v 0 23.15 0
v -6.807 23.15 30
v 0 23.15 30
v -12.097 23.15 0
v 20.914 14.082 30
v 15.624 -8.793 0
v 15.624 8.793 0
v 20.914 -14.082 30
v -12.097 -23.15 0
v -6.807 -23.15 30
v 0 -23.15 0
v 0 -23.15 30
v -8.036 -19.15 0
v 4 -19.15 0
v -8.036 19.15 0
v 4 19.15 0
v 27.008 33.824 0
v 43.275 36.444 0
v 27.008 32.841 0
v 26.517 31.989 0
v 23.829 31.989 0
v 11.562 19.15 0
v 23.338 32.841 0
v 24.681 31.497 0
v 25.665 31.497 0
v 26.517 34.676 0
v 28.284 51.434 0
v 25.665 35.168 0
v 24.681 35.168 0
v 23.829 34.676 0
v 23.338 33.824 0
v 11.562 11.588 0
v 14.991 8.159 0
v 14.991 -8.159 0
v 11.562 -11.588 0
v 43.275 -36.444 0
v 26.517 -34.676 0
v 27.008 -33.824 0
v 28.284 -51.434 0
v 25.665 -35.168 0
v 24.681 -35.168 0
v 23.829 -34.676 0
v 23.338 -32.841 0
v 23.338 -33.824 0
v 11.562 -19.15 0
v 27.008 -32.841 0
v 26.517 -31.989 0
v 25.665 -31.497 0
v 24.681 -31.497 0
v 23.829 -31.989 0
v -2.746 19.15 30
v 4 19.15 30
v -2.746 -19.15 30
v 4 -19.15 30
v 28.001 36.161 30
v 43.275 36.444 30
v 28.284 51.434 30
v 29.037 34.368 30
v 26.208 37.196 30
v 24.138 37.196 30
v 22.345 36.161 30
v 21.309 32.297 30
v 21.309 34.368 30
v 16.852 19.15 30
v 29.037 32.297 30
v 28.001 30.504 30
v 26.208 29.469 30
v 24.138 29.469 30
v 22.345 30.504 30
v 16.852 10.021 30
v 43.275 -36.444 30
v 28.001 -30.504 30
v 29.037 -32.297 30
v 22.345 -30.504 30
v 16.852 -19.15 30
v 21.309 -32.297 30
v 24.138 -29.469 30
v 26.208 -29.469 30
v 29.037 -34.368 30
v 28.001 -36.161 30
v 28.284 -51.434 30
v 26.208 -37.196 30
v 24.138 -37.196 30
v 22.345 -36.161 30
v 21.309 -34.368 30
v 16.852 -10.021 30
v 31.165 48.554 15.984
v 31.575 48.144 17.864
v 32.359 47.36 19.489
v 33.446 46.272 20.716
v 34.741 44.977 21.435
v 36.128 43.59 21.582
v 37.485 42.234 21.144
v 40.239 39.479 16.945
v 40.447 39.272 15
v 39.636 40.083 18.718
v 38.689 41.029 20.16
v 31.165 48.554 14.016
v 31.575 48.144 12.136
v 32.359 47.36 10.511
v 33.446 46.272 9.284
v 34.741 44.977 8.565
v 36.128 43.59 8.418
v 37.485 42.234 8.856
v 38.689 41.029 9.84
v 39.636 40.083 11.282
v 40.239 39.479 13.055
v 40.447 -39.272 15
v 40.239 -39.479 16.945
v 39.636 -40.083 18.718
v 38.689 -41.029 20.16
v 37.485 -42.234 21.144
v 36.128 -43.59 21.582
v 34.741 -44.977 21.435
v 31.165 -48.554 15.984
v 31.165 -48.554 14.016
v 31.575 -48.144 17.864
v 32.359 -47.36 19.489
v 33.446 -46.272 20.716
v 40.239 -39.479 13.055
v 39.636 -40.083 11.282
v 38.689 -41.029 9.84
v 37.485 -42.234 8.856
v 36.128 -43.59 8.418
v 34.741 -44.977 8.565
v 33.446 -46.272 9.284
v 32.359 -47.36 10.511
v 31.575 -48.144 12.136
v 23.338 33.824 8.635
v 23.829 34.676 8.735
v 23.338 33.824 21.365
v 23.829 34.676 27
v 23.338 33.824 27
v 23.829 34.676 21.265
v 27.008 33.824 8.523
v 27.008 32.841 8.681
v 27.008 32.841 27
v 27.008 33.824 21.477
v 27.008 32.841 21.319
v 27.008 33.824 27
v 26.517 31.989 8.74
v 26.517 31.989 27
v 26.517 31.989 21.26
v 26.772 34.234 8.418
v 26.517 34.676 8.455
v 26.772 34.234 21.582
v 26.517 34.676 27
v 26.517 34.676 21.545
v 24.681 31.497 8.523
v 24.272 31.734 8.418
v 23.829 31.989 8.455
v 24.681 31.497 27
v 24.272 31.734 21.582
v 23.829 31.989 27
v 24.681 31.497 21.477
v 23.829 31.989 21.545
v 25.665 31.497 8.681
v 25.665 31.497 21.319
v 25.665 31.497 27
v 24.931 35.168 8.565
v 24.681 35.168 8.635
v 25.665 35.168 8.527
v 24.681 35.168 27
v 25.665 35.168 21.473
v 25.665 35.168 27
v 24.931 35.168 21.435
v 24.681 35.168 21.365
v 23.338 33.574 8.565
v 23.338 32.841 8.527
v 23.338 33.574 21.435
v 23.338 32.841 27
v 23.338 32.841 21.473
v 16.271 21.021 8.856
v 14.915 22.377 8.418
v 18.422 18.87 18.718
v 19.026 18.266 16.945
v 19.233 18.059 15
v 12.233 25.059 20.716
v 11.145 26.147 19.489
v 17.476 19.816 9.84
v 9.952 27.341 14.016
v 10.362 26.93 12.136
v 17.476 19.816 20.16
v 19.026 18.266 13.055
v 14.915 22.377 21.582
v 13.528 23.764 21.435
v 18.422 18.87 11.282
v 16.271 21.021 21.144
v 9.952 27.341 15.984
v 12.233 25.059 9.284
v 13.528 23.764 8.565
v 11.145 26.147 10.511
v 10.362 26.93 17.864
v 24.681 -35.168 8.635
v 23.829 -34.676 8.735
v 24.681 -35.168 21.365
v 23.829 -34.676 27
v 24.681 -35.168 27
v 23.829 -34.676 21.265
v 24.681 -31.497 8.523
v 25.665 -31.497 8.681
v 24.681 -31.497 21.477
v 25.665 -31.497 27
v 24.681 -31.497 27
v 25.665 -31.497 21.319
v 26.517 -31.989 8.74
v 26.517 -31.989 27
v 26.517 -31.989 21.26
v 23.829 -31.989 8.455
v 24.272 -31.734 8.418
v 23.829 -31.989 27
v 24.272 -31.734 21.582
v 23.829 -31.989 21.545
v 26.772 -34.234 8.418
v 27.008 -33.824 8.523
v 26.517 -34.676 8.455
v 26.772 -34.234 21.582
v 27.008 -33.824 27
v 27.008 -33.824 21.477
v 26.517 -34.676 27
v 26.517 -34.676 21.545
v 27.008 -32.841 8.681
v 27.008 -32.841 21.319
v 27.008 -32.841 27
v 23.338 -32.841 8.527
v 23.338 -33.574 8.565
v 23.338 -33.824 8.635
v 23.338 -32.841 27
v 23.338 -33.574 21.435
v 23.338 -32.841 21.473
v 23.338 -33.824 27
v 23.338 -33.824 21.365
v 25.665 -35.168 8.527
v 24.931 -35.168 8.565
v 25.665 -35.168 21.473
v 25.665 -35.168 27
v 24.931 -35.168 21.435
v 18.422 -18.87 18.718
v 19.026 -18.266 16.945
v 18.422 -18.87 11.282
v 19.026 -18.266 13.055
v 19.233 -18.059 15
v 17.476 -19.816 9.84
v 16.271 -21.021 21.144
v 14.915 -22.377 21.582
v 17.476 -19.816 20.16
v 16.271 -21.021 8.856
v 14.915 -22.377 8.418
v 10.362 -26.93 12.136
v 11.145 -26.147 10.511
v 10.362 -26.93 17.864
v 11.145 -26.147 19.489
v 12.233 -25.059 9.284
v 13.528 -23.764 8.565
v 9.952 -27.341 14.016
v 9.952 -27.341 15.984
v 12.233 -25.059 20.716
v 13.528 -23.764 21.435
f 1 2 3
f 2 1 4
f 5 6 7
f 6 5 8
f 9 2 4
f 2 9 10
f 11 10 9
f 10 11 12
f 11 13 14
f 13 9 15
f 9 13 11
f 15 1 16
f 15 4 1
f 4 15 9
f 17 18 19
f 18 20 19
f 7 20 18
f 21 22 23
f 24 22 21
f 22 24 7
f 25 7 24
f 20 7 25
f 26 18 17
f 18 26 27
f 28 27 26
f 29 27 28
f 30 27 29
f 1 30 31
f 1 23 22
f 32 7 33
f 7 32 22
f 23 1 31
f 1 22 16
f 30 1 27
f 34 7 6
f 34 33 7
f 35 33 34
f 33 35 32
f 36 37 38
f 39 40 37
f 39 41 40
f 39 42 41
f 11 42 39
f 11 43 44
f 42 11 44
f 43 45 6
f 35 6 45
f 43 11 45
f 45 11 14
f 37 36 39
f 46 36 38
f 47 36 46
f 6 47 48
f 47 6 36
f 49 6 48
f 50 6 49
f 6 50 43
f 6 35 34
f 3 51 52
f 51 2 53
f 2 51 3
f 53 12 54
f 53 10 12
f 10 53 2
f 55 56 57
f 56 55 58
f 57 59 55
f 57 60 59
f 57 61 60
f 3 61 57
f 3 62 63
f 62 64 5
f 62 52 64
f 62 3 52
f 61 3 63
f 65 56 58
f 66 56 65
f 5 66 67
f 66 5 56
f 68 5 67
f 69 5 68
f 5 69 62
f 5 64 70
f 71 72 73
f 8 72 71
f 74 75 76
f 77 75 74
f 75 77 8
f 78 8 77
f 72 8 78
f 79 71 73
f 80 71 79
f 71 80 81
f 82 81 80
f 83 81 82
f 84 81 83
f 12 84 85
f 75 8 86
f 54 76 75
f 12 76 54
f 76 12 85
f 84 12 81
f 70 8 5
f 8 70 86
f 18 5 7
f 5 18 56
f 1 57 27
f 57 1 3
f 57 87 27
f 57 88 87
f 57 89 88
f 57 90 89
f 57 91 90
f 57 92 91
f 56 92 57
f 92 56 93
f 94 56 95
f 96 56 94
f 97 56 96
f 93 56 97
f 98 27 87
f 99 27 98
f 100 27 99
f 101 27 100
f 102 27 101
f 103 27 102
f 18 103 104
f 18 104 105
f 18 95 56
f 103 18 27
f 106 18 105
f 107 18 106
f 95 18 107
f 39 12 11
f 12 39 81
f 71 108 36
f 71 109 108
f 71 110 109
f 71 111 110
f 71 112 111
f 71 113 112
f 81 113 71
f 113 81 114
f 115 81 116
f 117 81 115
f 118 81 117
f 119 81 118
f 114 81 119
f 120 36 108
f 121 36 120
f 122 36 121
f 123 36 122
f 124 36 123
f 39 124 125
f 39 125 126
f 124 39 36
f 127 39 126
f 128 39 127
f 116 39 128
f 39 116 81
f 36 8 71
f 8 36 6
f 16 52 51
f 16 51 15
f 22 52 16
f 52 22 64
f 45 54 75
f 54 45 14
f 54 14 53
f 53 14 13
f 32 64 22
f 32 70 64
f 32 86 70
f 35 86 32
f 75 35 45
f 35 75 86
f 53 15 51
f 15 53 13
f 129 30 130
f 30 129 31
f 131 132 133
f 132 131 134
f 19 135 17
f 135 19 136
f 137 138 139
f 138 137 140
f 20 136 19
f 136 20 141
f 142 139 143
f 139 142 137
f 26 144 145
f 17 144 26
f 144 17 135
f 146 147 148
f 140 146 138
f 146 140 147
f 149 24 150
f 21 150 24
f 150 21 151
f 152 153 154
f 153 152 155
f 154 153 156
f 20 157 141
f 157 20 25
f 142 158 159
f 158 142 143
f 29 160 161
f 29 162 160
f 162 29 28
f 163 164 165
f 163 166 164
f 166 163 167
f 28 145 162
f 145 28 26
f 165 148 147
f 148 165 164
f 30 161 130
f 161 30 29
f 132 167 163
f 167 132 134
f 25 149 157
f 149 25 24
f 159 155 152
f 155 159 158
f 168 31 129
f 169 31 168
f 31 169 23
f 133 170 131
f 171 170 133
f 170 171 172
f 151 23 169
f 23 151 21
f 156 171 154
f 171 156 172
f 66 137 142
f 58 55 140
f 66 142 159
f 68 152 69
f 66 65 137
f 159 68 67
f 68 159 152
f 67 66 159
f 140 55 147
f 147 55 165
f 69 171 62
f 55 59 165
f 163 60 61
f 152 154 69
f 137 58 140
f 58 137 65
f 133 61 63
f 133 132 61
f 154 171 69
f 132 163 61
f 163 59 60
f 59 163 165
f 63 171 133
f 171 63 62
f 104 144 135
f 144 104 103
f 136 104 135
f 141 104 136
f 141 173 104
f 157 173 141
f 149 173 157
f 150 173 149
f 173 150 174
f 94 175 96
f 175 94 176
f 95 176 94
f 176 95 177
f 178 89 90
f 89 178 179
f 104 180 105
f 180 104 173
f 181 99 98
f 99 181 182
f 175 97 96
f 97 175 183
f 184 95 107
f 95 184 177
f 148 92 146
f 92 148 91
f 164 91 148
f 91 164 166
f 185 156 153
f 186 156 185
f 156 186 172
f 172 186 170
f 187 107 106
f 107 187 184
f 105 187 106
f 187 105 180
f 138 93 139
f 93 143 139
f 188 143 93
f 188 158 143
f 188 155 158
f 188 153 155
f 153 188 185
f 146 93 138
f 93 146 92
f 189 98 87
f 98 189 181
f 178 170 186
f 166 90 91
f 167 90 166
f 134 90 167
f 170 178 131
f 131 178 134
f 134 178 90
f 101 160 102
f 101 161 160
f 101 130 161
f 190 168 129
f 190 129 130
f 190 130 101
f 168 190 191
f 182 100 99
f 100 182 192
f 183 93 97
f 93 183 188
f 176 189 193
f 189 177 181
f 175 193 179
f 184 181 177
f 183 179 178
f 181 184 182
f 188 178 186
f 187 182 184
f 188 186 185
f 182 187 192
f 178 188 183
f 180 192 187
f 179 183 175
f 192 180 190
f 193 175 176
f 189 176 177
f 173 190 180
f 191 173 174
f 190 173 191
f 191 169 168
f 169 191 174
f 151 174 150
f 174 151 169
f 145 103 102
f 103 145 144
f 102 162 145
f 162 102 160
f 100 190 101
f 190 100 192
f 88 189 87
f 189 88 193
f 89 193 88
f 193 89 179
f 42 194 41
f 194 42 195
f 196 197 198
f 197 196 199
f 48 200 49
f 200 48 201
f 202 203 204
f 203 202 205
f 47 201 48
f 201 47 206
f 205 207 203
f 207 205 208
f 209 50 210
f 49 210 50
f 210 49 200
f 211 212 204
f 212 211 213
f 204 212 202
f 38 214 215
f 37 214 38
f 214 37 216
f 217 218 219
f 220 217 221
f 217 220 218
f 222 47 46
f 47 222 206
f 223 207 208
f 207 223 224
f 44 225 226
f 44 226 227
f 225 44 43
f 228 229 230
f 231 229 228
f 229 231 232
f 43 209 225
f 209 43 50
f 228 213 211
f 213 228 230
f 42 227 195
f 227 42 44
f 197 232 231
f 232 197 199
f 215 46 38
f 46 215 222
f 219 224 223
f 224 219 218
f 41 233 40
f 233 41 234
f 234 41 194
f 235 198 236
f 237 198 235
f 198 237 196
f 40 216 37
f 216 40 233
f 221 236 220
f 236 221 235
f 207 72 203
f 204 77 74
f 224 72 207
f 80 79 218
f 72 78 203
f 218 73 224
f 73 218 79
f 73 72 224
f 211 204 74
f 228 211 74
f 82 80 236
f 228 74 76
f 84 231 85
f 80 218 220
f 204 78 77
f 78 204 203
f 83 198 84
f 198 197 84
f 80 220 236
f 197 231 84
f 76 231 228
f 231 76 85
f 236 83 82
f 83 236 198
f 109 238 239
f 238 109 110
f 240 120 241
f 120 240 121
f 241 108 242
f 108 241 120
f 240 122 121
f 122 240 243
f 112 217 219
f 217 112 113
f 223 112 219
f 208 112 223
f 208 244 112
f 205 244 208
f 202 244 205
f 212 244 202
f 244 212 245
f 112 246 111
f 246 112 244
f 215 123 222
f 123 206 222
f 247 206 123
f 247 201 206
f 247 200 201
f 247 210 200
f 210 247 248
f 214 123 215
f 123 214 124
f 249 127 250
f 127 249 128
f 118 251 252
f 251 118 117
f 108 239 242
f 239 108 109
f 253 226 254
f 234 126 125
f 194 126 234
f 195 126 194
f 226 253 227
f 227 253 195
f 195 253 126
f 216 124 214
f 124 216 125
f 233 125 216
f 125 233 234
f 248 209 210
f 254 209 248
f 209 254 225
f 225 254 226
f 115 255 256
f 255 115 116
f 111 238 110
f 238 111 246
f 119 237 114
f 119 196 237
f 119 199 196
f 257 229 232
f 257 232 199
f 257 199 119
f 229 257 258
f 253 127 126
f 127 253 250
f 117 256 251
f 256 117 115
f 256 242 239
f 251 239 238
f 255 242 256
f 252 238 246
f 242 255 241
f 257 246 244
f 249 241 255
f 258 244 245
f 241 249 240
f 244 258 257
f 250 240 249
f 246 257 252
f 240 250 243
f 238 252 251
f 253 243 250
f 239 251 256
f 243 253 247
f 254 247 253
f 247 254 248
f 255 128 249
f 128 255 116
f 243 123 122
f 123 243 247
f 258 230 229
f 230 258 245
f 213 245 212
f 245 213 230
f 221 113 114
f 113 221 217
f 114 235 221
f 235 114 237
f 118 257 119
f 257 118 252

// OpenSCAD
difference(){
	union() {
		difference() {
			union() {
				difference() {
					difference() {
						translate(v = [0, 0, -10]) {
							rotate(a = 10, v = [0, 1, 0]) {
								translate(v = [-13.6500000000, -23.1500000000, 0]) {
									cube(size = [27.3000000000, 46.3000000000, 50]);
								}
							}
						}
						translate(v = [0, 0, -20]) {
							translate(v = [-50.0000000000, -50.0000000000, 0]) {
								cube(size = [100, 100, 20]);
							}
						}
					}
					translate(v = [0, 0, 30]) {
						translate(v = [-50.0000000000, -50.0000000000, 0]) {
							cube(size = [100, 100, 20]);
						}
					}
				}
				union() {
					translate(v = [0, 23.1500000000, 0]) {
						rotate(a = -45, v = [0, 0, 1]) {
							translate(v = [0, 0, 0]) {
								difference() {
									cube(size = [21.2000000000, 40, 30]);
									translate(v = [0, 40, 0]) {
									}
								}
							}
						}
					}
					translate(v = [0, -23.1500000000, 0]) {
						rotate(a = 45, v = [0, 0, 1]) {
							translate(v = [0, -40, 0]) {
								difference() {
									cube(size = [21.2000000000, 40, 30]);
								}
							}
						}
					}
				}
			}
			translate(v = [0, 0, -10]) {
				rotate(a = 10, v = [0, 1, 0]) {
					translate(v = [-9.6500000000, -19.1500000000, 0]) {
						cube(size = [19.3000000000, 38.3000000000, 50]);
					}
				}
			}
		}
	}
	/* Holes Below*/
	union(){
		difference(){
			union(){
				union(){
					translate(v = [0, 23.1500000000, 0]){
						rotate(a = -45, v = [0, 0, 1]){
							translate(v = [0, 0, 0]){
								union(){
									translate(v = [0, 40, 0]){
										union() {
											translate(v = [10.6000000000, 1, 15.0000000000]) {
												rotate(a = 90, v = [1, 0, 0]) {
													cylinder(h = 31, r = 6.6000000000);
												}
											}
											translate(v = [10.6000000000, -15.0000000000, 26]) {
												union() {
													union() {
														translate(v = [0, 0, -32]) {
															cylinder($fn = 12, h = 36, r = 1.9000000000);
														}
														translate(v = [0, 0, 1]) {
															cylinder($fn = 12, h = 3, r1 = 1.9000000000, r2 = 4);
														}
													}
													translate(v = [0, 0, 4]) {
														cylinder($fn = 12, h = 3, r = 4);
													}
												}
											}
										}
									}
								}
							}
						}
					}
					translate(v = [0, -23.1500000000, 0]){
						rotate(a = 45, v = [0, 0, 1]){
							translate(v = [0, -40, 0]){
								difference(){
									union() {
										translate(v = [10.6000000000, -1, 15.0000000000]) {
											rotate(a = -90, v = [1, 0, 0]) {
												cylinder(h = 31, r = 6.6000000000);
											}
										}
										translate(v = [10.6000000000, 15.0000000000, 26]) {
											union() {
												union() {
													translate(v = [0, 0, -32]) {
														cylinder($fn = 12, h = 36, r = 1.9000000000);
													}
													translate(v = [0, 0, 1]) {
														cylinder($fn = 12, h = 3, r1 = 1.9000000000, r2 = 4);
													}
												}
												translate(v = [0, 0, 4]) {
													cylinder($fn = 12, h = 3, r = 4);
												}
											}
										}
									}
								}
							}
						}
					}
				}
			}
		}
	} /* End Holes */ 
}
